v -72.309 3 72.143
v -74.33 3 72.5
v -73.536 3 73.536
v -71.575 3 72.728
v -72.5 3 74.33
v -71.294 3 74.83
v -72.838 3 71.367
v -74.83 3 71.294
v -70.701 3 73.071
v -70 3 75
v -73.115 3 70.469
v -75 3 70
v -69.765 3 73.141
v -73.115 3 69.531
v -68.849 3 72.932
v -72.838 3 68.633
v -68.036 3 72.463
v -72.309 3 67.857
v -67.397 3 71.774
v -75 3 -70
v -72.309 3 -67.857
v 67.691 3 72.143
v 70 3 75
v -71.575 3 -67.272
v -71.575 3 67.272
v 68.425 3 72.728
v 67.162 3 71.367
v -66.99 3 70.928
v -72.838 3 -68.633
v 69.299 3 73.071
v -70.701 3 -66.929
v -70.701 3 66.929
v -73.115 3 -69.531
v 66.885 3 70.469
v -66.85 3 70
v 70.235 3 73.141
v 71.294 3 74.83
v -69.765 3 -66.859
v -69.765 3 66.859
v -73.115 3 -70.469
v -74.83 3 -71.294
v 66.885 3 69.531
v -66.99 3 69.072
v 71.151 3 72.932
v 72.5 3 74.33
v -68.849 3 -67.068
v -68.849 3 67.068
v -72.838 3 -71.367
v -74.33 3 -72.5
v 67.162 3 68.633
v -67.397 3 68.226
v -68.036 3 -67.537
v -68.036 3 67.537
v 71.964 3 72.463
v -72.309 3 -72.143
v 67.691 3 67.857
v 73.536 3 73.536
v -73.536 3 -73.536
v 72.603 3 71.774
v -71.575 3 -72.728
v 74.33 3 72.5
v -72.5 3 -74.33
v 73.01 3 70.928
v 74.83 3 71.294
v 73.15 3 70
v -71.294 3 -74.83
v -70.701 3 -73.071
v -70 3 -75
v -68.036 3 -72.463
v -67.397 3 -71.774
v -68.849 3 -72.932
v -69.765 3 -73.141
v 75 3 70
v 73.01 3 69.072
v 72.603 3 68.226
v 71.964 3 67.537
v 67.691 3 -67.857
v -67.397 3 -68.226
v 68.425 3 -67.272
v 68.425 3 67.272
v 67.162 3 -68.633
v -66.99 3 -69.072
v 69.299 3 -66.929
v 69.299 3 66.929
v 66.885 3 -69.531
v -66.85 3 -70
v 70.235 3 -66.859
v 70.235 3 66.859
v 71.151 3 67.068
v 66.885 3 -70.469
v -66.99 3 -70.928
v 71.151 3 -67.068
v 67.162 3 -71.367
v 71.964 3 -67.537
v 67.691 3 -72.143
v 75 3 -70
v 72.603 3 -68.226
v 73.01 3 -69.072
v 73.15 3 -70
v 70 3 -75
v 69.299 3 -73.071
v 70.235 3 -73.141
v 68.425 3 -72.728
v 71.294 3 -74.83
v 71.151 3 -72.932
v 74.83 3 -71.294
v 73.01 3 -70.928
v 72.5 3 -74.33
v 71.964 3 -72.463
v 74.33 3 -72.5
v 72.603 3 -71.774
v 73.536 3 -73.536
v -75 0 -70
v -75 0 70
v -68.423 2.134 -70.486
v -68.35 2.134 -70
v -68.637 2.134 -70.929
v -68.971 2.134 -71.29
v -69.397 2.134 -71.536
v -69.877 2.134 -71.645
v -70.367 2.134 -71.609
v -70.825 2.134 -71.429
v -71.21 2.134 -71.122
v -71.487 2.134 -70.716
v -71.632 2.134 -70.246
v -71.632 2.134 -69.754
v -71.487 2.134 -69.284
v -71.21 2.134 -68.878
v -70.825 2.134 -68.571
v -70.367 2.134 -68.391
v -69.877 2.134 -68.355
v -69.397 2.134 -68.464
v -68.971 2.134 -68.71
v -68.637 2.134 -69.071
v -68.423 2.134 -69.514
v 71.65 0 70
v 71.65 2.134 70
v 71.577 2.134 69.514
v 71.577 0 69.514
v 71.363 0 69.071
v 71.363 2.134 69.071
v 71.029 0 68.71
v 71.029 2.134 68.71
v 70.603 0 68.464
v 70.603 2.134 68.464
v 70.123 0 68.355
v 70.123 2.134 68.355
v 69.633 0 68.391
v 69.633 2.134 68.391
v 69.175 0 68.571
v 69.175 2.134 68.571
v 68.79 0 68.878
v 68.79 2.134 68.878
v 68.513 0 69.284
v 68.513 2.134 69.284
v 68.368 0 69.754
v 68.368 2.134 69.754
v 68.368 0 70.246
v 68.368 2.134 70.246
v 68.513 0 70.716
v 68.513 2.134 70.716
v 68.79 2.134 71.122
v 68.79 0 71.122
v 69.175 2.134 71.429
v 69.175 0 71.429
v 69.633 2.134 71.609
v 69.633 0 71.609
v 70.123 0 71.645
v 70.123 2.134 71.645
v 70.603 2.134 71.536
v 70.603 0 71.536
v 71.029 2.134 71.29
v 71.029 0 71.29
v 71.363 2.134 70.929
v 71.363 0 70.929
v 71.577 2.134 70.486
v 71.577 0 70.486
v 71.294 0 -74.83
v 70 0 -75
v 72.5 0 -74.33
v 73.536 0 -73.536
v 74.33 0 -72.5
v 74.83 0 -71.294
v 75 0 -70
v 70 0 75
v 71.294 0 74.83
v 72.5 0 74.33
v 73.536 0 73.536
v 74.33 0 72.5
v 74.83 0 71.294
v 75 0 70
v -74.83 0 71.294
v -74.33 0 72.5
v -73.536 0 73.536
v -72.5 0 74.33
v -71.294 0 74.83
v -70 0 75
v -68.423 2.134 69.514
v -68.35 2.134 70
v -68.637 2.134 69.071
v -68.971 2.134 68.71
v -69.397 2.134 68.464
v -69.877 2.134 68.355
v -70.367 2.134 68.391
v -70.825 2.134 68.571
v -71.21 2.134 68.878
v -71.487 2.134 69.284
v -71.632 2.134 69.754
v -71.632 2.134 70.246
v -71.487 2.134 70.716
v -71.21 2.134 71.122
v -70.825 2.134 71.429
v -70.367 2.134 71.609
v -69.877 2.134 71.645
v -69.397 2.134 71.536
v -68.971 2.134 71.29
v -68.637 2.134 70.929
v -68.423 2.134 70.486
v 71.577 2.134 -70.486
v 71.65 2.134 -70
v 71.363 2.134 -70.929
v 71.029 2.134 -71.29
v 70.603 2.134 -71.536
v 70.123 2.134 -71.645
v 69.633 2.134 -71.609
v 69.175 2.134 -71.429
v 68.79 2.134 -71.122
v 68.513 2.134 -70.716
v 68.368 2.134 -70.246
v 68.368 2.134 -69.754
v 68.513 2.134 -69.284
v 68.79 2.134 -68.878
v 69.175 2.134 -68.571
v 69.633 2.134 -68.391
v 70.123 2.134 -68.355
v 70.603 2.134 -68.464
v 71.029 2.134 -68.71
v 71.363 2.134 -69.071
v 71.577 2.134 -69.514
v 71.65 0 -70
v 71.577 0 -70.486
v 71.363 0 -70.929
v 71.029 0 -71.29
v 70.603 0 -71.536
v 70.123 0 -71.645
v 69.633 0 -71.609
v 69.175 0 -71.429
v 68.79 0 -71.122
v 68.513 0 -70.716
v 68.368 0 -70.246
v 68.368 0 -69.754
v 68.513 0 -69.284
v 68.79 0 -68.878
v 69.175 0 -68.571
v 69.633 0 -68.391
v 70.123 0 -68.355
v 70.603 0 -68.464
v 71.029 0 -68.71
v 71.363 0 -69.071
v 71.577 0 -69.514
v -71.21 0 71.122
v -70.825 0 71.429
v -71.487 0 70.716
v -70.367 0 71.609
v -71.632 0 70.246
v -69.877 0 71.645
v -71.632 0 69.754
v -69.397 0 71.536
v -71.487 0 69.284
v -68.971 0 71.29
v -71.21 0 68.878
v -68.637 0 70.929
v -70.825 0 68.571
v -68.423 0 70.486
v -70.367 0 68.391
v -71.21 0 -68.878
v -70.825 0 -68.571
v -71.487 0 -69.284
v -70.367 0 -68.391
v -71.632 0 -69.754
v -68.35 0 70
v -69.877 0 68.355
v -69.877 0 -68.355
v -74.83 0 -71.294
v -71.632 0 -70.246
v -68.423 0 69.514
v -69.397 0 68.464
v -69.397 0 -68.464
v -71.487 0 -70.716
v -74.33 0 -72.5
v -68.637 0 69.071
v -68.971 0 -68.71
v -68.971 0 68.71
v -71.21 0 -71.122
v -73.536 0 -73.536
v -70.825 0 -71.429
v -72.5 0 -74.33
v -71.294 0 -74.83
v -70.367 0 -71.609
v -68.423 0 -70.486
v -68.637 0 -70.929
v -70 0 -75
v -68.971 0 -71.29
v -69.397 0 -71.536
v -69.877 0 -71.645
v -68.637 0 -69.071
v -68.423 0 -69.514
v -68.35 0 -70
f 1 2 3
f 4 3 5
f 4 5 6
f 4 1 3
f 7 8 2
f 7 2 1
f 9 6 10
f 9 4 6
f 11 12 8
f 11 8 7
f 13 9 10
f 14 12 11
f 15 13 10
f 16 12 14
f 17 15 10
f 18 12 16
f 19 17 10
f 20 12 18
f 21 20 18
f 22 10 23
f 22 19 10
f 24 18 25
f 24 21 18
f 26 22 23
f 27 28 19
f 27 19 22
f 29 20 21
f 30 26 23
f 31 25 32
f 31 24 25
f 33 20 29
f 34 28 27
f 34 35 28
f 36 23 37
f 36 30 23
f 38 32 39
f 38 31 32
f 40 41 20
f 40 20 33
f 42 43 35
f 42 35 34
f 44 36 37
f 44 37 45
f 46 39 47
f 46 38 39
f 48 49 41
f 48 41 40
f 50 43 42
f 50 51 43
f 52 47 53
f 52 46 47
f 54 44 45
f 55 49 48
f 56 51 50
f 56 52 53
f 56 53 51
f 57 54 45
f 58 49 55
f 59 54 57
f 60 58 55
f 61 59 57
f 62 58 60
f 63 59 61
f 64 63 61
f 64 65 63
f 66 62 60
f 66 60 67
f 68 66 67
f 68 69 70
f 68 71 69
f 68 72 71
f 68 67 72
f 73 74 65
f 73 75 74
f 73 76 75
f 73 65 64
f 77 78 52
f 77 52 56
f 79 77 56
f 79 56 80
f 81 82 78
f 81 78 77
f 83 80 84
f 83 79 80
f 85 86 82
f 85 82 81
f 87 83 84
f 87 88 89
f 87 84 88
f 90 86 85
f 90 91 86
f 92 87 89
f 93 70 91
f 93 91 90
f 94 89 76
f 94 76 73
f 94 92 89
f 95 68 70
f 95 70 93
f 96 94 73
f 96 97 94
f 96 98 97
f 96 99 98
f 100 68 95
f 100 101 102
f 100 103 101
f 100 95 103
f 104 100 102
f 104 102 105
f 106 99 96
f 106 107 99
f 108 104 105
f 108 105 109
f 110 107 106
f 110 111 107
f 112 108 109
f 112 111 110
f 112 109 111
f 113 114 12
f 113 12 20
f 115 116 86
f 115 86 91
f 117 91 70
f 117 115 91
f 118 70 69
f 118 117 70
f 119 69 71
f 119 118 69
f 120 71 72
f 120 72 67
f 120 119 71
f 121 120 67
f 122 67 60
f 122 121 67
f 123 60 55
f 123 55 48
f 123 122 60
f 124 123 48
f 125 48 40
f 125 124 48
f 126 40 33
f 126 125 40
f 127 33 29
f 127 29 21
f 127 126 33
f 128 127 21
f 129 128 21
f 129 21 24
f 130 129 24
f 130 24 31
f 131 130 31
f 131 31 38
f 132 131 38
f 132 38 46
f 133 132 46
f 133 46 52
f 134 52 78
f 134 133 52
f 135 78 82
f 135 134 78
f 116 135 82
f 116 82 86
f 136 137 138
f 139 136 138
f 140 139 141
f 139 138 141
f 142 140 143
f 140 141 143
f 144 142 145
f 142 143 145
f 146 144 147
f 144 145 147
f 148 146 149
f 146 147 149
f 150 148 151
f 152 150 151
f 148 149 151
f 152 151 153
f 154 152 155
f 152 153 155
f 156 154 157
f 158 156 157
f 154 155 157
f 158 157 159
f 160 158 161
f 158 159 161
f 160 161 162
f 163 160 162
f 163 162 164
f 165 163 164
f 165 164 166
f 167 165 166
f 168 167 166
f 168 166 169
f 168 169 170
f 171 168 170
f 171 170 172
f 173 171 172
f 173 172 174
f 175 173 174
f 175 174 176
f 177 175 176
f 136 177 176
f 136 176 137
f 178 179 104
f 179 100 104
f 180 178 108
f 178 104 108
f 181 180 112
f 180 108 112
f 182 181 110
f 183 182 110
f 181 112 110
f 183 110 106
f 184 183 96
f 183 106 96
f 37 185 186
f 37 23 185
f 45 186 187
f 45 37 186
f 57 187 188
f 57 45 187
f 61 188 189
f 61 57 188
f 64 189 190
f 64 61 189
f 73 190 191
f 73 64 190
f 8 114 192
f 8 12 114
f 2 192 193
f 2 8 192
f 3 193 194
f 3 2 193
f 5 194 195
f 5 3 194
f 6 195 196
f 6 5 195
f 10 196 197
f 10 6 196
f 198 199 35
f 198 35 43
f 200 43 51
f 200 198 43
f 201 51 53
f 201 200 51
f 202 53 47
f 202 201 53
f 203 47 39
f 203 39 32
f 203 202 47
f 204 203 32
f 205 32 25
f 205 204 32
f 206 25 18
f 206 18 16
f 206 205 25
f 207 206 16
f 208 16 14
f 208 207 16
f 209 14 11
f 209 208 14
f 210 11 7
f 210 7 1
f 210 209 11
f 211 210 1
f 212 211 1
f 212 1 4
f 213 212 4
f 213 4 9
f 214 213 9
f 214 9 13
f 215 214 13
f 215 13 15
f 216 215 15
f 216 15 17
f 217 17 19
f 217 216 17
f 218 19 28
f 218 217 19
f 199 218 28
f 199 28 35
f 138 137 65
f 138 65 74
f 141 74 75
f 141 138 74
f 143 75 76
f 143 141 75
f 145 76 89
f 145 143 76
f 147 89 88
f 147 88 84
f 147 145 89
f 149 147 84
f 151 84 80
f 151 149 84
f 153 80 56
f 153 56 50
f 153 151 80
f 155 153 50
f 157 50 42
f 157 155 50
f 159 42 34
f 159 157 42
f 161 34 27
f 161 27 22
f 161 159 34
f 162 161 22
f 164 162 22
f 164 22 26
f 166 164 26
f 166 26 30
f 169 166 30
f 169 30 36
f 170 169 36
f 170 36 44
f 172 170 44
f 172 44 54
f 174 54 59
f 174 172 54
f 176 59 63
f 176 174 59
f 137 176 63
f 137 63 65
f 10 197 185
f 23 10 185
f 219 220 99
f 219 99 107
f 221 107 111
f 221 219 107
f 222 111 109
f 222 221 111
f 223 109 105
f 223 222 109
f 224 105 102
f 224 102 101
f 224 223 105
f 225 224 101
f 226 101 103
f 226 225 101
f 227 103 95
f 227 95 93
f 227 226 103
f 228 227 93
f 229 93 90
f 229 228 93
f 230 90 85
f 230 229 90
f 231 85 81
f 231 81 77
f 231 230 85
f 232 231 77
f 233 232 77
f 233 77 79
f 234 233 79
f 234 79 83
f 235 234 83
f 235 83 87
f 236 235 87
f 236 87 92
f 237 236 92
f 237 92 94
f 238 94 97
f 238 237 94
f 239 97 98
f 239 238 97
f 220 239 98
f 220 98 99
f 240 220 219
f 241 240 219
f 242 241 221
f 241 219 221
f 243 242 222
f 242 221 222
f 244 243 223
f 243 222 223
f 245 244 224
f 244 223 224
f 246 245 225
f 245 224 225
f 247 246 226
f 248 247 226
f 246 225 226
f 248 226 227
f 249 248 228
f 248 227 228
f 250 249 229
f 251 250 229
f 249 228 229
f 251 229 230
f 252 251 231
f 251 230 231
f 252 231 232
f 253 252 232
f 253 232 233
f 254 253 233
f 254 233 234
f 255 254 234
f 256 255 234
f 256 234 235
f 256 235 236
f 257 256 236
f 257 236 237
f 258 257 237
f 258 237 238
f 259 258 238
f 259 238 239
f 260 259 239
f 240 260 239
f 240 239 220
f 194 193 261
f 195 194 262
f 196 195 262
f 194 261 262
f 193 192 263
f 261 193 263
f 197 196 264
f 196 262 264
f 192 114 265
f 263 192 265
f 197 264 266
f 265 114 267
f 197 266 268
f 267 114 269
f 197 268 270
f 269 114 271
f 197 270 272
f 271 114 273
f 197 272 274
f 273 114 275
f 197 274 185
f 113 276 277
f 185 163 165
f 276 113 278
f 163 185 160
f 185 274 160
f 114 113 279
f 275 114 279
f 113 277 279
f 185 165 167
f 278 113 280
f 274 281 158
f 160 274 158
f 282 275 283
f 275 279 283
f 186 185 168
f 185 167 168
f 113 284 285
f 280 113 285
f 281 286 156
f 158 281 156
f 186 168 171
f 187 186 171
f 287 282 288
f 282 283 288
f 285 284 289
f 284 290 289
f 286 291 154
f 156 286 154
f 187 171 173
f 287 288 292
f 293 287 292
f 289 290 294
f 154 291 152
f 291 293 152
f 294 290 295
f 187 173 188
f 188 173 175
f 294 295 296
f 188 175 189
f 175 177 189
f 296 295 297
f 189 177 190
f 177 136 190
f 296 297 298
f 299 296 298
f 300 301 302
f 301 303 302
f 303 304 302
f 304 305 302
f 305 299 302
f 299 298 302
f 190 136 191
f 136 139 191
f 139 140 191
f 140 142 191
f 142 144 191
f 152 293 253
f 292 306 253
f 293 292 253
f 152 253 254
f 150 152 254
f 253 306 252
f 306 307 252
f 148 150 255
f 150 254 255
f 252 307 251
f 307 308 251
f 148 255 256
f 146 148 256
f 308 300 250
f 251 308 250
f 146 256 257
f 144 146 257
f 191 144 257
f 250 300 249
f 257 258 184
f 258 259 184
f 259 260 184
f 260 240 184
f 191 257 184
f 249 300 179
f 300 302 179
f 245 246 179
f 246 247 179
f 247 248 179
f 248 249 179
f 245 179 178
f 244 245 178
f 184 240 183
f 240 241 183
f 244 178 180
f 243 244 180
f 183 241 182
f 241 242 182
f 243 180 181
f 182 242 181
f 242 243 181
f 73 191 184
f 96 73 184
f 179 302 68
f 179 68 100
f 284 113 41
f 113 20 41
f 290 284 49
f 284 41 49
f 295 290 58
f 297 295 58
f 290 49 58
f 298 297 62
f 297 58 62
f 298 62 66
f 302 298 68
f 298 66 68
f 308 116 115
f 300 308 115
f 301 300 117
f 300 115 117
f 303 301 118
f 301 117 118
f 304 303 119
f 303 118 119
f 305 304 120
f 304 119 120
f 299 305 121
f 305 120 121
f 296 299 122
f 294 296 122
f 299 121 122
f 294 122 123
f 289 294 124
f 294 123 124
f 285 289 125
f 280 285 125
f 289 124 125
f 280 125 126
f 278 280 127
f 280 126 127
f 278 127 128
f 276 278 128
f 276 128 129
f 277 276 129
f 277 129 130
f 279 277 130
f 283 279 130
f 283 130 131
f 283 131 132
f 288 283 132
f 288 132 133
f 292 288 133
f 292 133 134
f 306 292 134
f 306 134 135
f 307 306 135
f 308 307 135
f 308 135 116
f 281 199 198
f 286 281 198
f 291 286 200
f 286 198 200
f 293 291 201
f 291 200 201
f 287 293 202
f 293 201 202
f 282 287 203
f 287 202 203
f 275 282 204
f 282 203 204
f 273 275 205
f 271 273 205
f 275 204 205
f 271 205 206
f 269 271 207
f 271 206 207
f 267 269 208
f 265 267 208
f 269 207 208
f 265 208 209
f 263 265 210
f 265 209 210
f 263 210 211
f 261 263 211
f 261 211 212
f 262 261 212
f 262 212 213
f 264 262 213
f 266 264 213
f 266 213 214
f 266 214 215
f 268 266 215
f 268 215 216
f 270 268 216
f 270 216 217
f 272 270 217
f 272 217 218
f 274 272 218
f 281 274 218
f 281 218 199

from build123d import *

# Parameters (mm, degrees)
SKETCH1_W           = 150
SKETCH1_H           = 150
BOSS_EXTRUDE1_DEPTH = 3
CUT_EXTRUDE1_REACH  = 5
SKETCH2_R           = 1.65
CHAMFER1_SIZE       = 1.5
CHAMFER1_SIZE2      = 0.866025404
FILLET1_R           = 5


with BuildPart() as part:
    # Sketch1 → Boss-Extrude1 (new body)
    with BuildSketch(Plane(origin=(0, 0, 0), x_dir=(1, 0, 0), z_dir=(0, 1, 0))):
        Rectangle(SKETCH1_W, SKETCH1_H)
    extrude(amount=BOSS_EXTRUDE1_DEPTH)

    # Sketch2 → Cut-Extrude1 (cut, up to next)
    with BuildSketch(Plane(origin=(0, 3, 0), x_dir=(1, 0, 0), z_dir=(0, 1, 0)), mode=Mode.PRIVATE) as cut_extrude1_sk1:
        with Locations((-70, 70)):
            Circle(SKETCH2_R)
    cut_extrude1_tool1 = extrude(cut_extrude1_sk1.sketch, amount=-CUT_EXTRUDE1_REACH, mode=Mode.PRIVATE) & part.part
    add(cut_extrude1_tool1.solids().sort_by_distance((-70, 3, -70))[0], mode=Mode.SUBTRACT)
    # Sketch2 → Cut-Extrude1 (cut, up to next)
    with BuildSketch(Plane(origin=(0, 3, 0), x_dir=(1, 0, 0), z_dir=(0, 1, 0)), mode=Mode.PRIVATE) as cut_extrude1_sk2:
        with Locations((70, 70)):
            Circle(SKETCH2_R)
    cut_extrude1_tool2 = extrude(cut_extrude1_sk2.sketch, amount=-CUT_EXTRUDE1_REACH, mode=Mode.PRIVATE) & part.part
    add(cut_extrude1_tool2.solids().sort_by_distance((70, 3, -70))[0], mode=Mode.SUBTRACT)
    # Sketch2 → Cut-Extrude1 (cut, up to next)
    with BuildSketch(Plane(origin=(0, 3, 0), x_dir=(1, 0, 0), z_dir=(0, 1, 0)), mode=Mode.PRIVATE) as cut_extrude1_sk3:
        with Locations((70, -70)):
            Circle(SKETCH2_R)
    cut_extrude1_tool3 = extrude(cut_extrude1_sk3.sketch, amount=-CUT_EXTRUDE1_REACH, mode=Mode.PRIVATE) & part.part
    add(cut_extrude1_tool3.solids().sort_by_distance((70, 3, 70))[0], mode=Mode.SUBTRACT)
    # Sketch2 → Cut-Extrude1 (cut, up to next)
    with BuildSketch(Plane(origin=(0, 3, 0), x_dir=(1, 0, 0), z_dir=(0, 1, 0)), mode=Mode.PRIVATE) as cut_extrude1_sk4:
        with Locations((-70, -70)):
            Circle(SKETCH2_R)
    cut_extrude1_tool4 = extrude(cut_extrude1_sk4.sketch, amount=-CUT_EXTRUDE1_REACH, mode=Mode.PRIVATE) & part.part
    add(cut_extrude1_tool4.solids().sort_by_distance((-70, 3, 70))[0], mode=Mode.SUBTRACT)

    # Chamfer1
    chamfer1_edges = [part.edges().sort_by_distance(p)[0] for p in [
        (-71.65, 3, 70),
        (68.35, 3, 70),
        (68.35, 3, -70),
        (-71.65, 3, -70),
    ]]
    chamfer1_side = [part.faces().sort_by_distance(p)[0] for p in [
        (0, 3, 0),
    ]]
    chamfer(chamfer1_edges, length=CHAMFER1_SIZE, length2=CHAMFER1_SIZE2, reference=chamfer1_side[0])

    # Fillet1
    fillet1_edges = [part.edges().sort_by_distance(p)[0] for p in [
        (75, 1.5, 75),
        (-75, 1.5, 75),
        (-75, 1.5, -75),
        (75, 1.5, -75),
    ]]
    fillet(fillet1_edges, radius=FILLET1_R)


solid = part.part
